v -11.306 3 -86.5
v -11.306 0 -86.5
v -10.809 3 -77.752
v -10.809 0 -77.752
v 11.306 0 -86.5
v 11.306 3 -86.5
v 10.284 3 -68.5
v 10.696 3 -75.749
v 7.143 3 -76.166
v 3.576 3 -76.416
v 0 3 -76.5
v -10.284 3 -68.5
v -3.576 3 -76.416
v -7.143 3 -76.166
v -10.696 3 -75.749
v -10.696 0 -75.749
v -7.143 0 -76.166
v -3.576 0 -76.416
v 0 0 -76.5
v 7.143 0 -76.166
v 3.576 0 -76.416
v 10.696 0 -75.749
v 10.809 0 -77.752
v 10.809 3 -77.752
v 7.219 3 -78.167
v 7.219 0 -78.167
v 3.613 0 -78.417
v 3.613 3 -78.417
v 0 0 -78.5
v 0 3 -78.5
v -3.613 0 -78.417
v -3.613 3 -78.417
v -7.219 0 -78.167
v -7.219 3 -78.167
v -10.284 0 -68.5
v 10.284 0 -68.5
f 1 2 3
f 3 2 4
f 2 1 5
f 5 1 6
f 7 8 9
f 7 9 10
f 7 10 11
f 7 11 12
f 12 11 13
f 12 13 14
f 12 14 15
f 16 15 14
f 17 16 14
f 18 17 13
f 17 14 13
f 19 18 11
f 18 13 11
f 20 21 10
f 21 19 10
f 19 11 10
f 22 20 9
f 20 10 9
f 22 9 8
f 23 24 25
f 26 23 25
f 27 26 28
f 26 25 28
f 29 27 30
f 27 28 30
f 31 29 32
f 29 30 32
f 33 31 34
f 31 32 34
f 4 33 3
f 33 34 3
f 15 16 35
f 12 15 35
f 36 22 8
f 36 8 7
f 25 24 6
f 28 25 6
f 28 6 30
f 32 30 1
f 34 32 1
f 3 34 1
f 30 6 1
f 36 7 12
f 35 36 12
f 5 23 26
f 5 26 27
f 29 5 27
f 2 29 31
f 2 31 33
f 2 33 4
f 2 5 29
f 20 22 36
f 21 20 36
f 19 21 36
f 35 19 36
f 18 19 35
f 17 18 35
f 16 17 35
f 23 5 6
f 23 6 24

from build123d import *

# Parameters (mm, degrees)
BOSS_EXTRUDE1_DEPTH      = 3
CUT_EXTRUDE10_DEPTH      = 1
CUT_EXTRUDE10_DEPTH_BACK = 4
CUT_EXTRUDE11_DEPTH      = 1
CUT_EXTRUDE11_DEPTH_BACK = 4


with BuildPart() as part:
    # Sketch1 → Boss-Extrude1 (new body)
    with BuildSketch(Plane(origin=(0, 0, 0), x_dir=(1, 0, 0), z_dir=(0, 1, 0))):
        Polygon((-11.589955224, 91.5), (-10, 63.5), (0, 63.5), (0, 91.5), align=None)
    extrude(amount=BOSS_EXTRUDE1_DEPTH)

    # Sketch55 → Cut-Extrude10 (cut, two sides)
    with BuildSketch(Plane(origin=(0, 3, 0), x_dir=(1, 0, 0), z_dir=(0, 1, 0))) as cut_extrude10_sk:
        Polygon((-10.283920576, 68.5), (0, 68.5), (0, 63.5), (-10, 63.5), align=None)
        Polygon((-11.306034648, 86.5), (-11.589955224, 91.5), (0, 91.5), (0, 86.5), align=None)
    extrude(amount=CUT_EXTRUDE10_DEPTH, mode=Mode.SUBTRACT)
    extrude(cut_extrude10_sk.sketch, amount=-CUT_EXTRUDE10_DEPTH_BACK, mode=Mode.SUBTRACT)

    # Mirror14: part across plane


with BuildPart() as part_1:
    add(part.part)
    add(part.part.mirror(Plane(origin=(0, 0, 0), x_dir=(0, 0, 1), z_dir=(1, 0, 0))))

    # Sketch56 → Cut-Extrude11 (cut, two sides)
    with BuildSketch(Plane(origin=(0, 3, 0), x_dir=(1, 0, 0), z_dir=(0, 1, 0))) as cut_extrude11_sk:
        with BuildLine():
            Line((-10.829714823, 77.74938763), (-10.695527892, 75.74863486))
            ThreePointArc((-10.695527892, 75.74863486), (0, 76.5), (10.695527892, 75.74863486))
            Line((10.695527892, 75.74863486), (10.809300181, 77.752228454))
            ThreePointArc((10.809300181, 77.752228454), (-0.010305677, 78.499999324), (-10.829714823, 77.74938763))
        make_face()
    extrude(amount=CUT_EXTRUDE11_DEPTH, mode=Mode.SUBTRACT)
    extrude(cut_extrude11_sk.sketch, amount=-CUT_EXTRUDE11_DEPTH_BACK, mode=Mode.SUBTRACT)


solid = part_1.part
